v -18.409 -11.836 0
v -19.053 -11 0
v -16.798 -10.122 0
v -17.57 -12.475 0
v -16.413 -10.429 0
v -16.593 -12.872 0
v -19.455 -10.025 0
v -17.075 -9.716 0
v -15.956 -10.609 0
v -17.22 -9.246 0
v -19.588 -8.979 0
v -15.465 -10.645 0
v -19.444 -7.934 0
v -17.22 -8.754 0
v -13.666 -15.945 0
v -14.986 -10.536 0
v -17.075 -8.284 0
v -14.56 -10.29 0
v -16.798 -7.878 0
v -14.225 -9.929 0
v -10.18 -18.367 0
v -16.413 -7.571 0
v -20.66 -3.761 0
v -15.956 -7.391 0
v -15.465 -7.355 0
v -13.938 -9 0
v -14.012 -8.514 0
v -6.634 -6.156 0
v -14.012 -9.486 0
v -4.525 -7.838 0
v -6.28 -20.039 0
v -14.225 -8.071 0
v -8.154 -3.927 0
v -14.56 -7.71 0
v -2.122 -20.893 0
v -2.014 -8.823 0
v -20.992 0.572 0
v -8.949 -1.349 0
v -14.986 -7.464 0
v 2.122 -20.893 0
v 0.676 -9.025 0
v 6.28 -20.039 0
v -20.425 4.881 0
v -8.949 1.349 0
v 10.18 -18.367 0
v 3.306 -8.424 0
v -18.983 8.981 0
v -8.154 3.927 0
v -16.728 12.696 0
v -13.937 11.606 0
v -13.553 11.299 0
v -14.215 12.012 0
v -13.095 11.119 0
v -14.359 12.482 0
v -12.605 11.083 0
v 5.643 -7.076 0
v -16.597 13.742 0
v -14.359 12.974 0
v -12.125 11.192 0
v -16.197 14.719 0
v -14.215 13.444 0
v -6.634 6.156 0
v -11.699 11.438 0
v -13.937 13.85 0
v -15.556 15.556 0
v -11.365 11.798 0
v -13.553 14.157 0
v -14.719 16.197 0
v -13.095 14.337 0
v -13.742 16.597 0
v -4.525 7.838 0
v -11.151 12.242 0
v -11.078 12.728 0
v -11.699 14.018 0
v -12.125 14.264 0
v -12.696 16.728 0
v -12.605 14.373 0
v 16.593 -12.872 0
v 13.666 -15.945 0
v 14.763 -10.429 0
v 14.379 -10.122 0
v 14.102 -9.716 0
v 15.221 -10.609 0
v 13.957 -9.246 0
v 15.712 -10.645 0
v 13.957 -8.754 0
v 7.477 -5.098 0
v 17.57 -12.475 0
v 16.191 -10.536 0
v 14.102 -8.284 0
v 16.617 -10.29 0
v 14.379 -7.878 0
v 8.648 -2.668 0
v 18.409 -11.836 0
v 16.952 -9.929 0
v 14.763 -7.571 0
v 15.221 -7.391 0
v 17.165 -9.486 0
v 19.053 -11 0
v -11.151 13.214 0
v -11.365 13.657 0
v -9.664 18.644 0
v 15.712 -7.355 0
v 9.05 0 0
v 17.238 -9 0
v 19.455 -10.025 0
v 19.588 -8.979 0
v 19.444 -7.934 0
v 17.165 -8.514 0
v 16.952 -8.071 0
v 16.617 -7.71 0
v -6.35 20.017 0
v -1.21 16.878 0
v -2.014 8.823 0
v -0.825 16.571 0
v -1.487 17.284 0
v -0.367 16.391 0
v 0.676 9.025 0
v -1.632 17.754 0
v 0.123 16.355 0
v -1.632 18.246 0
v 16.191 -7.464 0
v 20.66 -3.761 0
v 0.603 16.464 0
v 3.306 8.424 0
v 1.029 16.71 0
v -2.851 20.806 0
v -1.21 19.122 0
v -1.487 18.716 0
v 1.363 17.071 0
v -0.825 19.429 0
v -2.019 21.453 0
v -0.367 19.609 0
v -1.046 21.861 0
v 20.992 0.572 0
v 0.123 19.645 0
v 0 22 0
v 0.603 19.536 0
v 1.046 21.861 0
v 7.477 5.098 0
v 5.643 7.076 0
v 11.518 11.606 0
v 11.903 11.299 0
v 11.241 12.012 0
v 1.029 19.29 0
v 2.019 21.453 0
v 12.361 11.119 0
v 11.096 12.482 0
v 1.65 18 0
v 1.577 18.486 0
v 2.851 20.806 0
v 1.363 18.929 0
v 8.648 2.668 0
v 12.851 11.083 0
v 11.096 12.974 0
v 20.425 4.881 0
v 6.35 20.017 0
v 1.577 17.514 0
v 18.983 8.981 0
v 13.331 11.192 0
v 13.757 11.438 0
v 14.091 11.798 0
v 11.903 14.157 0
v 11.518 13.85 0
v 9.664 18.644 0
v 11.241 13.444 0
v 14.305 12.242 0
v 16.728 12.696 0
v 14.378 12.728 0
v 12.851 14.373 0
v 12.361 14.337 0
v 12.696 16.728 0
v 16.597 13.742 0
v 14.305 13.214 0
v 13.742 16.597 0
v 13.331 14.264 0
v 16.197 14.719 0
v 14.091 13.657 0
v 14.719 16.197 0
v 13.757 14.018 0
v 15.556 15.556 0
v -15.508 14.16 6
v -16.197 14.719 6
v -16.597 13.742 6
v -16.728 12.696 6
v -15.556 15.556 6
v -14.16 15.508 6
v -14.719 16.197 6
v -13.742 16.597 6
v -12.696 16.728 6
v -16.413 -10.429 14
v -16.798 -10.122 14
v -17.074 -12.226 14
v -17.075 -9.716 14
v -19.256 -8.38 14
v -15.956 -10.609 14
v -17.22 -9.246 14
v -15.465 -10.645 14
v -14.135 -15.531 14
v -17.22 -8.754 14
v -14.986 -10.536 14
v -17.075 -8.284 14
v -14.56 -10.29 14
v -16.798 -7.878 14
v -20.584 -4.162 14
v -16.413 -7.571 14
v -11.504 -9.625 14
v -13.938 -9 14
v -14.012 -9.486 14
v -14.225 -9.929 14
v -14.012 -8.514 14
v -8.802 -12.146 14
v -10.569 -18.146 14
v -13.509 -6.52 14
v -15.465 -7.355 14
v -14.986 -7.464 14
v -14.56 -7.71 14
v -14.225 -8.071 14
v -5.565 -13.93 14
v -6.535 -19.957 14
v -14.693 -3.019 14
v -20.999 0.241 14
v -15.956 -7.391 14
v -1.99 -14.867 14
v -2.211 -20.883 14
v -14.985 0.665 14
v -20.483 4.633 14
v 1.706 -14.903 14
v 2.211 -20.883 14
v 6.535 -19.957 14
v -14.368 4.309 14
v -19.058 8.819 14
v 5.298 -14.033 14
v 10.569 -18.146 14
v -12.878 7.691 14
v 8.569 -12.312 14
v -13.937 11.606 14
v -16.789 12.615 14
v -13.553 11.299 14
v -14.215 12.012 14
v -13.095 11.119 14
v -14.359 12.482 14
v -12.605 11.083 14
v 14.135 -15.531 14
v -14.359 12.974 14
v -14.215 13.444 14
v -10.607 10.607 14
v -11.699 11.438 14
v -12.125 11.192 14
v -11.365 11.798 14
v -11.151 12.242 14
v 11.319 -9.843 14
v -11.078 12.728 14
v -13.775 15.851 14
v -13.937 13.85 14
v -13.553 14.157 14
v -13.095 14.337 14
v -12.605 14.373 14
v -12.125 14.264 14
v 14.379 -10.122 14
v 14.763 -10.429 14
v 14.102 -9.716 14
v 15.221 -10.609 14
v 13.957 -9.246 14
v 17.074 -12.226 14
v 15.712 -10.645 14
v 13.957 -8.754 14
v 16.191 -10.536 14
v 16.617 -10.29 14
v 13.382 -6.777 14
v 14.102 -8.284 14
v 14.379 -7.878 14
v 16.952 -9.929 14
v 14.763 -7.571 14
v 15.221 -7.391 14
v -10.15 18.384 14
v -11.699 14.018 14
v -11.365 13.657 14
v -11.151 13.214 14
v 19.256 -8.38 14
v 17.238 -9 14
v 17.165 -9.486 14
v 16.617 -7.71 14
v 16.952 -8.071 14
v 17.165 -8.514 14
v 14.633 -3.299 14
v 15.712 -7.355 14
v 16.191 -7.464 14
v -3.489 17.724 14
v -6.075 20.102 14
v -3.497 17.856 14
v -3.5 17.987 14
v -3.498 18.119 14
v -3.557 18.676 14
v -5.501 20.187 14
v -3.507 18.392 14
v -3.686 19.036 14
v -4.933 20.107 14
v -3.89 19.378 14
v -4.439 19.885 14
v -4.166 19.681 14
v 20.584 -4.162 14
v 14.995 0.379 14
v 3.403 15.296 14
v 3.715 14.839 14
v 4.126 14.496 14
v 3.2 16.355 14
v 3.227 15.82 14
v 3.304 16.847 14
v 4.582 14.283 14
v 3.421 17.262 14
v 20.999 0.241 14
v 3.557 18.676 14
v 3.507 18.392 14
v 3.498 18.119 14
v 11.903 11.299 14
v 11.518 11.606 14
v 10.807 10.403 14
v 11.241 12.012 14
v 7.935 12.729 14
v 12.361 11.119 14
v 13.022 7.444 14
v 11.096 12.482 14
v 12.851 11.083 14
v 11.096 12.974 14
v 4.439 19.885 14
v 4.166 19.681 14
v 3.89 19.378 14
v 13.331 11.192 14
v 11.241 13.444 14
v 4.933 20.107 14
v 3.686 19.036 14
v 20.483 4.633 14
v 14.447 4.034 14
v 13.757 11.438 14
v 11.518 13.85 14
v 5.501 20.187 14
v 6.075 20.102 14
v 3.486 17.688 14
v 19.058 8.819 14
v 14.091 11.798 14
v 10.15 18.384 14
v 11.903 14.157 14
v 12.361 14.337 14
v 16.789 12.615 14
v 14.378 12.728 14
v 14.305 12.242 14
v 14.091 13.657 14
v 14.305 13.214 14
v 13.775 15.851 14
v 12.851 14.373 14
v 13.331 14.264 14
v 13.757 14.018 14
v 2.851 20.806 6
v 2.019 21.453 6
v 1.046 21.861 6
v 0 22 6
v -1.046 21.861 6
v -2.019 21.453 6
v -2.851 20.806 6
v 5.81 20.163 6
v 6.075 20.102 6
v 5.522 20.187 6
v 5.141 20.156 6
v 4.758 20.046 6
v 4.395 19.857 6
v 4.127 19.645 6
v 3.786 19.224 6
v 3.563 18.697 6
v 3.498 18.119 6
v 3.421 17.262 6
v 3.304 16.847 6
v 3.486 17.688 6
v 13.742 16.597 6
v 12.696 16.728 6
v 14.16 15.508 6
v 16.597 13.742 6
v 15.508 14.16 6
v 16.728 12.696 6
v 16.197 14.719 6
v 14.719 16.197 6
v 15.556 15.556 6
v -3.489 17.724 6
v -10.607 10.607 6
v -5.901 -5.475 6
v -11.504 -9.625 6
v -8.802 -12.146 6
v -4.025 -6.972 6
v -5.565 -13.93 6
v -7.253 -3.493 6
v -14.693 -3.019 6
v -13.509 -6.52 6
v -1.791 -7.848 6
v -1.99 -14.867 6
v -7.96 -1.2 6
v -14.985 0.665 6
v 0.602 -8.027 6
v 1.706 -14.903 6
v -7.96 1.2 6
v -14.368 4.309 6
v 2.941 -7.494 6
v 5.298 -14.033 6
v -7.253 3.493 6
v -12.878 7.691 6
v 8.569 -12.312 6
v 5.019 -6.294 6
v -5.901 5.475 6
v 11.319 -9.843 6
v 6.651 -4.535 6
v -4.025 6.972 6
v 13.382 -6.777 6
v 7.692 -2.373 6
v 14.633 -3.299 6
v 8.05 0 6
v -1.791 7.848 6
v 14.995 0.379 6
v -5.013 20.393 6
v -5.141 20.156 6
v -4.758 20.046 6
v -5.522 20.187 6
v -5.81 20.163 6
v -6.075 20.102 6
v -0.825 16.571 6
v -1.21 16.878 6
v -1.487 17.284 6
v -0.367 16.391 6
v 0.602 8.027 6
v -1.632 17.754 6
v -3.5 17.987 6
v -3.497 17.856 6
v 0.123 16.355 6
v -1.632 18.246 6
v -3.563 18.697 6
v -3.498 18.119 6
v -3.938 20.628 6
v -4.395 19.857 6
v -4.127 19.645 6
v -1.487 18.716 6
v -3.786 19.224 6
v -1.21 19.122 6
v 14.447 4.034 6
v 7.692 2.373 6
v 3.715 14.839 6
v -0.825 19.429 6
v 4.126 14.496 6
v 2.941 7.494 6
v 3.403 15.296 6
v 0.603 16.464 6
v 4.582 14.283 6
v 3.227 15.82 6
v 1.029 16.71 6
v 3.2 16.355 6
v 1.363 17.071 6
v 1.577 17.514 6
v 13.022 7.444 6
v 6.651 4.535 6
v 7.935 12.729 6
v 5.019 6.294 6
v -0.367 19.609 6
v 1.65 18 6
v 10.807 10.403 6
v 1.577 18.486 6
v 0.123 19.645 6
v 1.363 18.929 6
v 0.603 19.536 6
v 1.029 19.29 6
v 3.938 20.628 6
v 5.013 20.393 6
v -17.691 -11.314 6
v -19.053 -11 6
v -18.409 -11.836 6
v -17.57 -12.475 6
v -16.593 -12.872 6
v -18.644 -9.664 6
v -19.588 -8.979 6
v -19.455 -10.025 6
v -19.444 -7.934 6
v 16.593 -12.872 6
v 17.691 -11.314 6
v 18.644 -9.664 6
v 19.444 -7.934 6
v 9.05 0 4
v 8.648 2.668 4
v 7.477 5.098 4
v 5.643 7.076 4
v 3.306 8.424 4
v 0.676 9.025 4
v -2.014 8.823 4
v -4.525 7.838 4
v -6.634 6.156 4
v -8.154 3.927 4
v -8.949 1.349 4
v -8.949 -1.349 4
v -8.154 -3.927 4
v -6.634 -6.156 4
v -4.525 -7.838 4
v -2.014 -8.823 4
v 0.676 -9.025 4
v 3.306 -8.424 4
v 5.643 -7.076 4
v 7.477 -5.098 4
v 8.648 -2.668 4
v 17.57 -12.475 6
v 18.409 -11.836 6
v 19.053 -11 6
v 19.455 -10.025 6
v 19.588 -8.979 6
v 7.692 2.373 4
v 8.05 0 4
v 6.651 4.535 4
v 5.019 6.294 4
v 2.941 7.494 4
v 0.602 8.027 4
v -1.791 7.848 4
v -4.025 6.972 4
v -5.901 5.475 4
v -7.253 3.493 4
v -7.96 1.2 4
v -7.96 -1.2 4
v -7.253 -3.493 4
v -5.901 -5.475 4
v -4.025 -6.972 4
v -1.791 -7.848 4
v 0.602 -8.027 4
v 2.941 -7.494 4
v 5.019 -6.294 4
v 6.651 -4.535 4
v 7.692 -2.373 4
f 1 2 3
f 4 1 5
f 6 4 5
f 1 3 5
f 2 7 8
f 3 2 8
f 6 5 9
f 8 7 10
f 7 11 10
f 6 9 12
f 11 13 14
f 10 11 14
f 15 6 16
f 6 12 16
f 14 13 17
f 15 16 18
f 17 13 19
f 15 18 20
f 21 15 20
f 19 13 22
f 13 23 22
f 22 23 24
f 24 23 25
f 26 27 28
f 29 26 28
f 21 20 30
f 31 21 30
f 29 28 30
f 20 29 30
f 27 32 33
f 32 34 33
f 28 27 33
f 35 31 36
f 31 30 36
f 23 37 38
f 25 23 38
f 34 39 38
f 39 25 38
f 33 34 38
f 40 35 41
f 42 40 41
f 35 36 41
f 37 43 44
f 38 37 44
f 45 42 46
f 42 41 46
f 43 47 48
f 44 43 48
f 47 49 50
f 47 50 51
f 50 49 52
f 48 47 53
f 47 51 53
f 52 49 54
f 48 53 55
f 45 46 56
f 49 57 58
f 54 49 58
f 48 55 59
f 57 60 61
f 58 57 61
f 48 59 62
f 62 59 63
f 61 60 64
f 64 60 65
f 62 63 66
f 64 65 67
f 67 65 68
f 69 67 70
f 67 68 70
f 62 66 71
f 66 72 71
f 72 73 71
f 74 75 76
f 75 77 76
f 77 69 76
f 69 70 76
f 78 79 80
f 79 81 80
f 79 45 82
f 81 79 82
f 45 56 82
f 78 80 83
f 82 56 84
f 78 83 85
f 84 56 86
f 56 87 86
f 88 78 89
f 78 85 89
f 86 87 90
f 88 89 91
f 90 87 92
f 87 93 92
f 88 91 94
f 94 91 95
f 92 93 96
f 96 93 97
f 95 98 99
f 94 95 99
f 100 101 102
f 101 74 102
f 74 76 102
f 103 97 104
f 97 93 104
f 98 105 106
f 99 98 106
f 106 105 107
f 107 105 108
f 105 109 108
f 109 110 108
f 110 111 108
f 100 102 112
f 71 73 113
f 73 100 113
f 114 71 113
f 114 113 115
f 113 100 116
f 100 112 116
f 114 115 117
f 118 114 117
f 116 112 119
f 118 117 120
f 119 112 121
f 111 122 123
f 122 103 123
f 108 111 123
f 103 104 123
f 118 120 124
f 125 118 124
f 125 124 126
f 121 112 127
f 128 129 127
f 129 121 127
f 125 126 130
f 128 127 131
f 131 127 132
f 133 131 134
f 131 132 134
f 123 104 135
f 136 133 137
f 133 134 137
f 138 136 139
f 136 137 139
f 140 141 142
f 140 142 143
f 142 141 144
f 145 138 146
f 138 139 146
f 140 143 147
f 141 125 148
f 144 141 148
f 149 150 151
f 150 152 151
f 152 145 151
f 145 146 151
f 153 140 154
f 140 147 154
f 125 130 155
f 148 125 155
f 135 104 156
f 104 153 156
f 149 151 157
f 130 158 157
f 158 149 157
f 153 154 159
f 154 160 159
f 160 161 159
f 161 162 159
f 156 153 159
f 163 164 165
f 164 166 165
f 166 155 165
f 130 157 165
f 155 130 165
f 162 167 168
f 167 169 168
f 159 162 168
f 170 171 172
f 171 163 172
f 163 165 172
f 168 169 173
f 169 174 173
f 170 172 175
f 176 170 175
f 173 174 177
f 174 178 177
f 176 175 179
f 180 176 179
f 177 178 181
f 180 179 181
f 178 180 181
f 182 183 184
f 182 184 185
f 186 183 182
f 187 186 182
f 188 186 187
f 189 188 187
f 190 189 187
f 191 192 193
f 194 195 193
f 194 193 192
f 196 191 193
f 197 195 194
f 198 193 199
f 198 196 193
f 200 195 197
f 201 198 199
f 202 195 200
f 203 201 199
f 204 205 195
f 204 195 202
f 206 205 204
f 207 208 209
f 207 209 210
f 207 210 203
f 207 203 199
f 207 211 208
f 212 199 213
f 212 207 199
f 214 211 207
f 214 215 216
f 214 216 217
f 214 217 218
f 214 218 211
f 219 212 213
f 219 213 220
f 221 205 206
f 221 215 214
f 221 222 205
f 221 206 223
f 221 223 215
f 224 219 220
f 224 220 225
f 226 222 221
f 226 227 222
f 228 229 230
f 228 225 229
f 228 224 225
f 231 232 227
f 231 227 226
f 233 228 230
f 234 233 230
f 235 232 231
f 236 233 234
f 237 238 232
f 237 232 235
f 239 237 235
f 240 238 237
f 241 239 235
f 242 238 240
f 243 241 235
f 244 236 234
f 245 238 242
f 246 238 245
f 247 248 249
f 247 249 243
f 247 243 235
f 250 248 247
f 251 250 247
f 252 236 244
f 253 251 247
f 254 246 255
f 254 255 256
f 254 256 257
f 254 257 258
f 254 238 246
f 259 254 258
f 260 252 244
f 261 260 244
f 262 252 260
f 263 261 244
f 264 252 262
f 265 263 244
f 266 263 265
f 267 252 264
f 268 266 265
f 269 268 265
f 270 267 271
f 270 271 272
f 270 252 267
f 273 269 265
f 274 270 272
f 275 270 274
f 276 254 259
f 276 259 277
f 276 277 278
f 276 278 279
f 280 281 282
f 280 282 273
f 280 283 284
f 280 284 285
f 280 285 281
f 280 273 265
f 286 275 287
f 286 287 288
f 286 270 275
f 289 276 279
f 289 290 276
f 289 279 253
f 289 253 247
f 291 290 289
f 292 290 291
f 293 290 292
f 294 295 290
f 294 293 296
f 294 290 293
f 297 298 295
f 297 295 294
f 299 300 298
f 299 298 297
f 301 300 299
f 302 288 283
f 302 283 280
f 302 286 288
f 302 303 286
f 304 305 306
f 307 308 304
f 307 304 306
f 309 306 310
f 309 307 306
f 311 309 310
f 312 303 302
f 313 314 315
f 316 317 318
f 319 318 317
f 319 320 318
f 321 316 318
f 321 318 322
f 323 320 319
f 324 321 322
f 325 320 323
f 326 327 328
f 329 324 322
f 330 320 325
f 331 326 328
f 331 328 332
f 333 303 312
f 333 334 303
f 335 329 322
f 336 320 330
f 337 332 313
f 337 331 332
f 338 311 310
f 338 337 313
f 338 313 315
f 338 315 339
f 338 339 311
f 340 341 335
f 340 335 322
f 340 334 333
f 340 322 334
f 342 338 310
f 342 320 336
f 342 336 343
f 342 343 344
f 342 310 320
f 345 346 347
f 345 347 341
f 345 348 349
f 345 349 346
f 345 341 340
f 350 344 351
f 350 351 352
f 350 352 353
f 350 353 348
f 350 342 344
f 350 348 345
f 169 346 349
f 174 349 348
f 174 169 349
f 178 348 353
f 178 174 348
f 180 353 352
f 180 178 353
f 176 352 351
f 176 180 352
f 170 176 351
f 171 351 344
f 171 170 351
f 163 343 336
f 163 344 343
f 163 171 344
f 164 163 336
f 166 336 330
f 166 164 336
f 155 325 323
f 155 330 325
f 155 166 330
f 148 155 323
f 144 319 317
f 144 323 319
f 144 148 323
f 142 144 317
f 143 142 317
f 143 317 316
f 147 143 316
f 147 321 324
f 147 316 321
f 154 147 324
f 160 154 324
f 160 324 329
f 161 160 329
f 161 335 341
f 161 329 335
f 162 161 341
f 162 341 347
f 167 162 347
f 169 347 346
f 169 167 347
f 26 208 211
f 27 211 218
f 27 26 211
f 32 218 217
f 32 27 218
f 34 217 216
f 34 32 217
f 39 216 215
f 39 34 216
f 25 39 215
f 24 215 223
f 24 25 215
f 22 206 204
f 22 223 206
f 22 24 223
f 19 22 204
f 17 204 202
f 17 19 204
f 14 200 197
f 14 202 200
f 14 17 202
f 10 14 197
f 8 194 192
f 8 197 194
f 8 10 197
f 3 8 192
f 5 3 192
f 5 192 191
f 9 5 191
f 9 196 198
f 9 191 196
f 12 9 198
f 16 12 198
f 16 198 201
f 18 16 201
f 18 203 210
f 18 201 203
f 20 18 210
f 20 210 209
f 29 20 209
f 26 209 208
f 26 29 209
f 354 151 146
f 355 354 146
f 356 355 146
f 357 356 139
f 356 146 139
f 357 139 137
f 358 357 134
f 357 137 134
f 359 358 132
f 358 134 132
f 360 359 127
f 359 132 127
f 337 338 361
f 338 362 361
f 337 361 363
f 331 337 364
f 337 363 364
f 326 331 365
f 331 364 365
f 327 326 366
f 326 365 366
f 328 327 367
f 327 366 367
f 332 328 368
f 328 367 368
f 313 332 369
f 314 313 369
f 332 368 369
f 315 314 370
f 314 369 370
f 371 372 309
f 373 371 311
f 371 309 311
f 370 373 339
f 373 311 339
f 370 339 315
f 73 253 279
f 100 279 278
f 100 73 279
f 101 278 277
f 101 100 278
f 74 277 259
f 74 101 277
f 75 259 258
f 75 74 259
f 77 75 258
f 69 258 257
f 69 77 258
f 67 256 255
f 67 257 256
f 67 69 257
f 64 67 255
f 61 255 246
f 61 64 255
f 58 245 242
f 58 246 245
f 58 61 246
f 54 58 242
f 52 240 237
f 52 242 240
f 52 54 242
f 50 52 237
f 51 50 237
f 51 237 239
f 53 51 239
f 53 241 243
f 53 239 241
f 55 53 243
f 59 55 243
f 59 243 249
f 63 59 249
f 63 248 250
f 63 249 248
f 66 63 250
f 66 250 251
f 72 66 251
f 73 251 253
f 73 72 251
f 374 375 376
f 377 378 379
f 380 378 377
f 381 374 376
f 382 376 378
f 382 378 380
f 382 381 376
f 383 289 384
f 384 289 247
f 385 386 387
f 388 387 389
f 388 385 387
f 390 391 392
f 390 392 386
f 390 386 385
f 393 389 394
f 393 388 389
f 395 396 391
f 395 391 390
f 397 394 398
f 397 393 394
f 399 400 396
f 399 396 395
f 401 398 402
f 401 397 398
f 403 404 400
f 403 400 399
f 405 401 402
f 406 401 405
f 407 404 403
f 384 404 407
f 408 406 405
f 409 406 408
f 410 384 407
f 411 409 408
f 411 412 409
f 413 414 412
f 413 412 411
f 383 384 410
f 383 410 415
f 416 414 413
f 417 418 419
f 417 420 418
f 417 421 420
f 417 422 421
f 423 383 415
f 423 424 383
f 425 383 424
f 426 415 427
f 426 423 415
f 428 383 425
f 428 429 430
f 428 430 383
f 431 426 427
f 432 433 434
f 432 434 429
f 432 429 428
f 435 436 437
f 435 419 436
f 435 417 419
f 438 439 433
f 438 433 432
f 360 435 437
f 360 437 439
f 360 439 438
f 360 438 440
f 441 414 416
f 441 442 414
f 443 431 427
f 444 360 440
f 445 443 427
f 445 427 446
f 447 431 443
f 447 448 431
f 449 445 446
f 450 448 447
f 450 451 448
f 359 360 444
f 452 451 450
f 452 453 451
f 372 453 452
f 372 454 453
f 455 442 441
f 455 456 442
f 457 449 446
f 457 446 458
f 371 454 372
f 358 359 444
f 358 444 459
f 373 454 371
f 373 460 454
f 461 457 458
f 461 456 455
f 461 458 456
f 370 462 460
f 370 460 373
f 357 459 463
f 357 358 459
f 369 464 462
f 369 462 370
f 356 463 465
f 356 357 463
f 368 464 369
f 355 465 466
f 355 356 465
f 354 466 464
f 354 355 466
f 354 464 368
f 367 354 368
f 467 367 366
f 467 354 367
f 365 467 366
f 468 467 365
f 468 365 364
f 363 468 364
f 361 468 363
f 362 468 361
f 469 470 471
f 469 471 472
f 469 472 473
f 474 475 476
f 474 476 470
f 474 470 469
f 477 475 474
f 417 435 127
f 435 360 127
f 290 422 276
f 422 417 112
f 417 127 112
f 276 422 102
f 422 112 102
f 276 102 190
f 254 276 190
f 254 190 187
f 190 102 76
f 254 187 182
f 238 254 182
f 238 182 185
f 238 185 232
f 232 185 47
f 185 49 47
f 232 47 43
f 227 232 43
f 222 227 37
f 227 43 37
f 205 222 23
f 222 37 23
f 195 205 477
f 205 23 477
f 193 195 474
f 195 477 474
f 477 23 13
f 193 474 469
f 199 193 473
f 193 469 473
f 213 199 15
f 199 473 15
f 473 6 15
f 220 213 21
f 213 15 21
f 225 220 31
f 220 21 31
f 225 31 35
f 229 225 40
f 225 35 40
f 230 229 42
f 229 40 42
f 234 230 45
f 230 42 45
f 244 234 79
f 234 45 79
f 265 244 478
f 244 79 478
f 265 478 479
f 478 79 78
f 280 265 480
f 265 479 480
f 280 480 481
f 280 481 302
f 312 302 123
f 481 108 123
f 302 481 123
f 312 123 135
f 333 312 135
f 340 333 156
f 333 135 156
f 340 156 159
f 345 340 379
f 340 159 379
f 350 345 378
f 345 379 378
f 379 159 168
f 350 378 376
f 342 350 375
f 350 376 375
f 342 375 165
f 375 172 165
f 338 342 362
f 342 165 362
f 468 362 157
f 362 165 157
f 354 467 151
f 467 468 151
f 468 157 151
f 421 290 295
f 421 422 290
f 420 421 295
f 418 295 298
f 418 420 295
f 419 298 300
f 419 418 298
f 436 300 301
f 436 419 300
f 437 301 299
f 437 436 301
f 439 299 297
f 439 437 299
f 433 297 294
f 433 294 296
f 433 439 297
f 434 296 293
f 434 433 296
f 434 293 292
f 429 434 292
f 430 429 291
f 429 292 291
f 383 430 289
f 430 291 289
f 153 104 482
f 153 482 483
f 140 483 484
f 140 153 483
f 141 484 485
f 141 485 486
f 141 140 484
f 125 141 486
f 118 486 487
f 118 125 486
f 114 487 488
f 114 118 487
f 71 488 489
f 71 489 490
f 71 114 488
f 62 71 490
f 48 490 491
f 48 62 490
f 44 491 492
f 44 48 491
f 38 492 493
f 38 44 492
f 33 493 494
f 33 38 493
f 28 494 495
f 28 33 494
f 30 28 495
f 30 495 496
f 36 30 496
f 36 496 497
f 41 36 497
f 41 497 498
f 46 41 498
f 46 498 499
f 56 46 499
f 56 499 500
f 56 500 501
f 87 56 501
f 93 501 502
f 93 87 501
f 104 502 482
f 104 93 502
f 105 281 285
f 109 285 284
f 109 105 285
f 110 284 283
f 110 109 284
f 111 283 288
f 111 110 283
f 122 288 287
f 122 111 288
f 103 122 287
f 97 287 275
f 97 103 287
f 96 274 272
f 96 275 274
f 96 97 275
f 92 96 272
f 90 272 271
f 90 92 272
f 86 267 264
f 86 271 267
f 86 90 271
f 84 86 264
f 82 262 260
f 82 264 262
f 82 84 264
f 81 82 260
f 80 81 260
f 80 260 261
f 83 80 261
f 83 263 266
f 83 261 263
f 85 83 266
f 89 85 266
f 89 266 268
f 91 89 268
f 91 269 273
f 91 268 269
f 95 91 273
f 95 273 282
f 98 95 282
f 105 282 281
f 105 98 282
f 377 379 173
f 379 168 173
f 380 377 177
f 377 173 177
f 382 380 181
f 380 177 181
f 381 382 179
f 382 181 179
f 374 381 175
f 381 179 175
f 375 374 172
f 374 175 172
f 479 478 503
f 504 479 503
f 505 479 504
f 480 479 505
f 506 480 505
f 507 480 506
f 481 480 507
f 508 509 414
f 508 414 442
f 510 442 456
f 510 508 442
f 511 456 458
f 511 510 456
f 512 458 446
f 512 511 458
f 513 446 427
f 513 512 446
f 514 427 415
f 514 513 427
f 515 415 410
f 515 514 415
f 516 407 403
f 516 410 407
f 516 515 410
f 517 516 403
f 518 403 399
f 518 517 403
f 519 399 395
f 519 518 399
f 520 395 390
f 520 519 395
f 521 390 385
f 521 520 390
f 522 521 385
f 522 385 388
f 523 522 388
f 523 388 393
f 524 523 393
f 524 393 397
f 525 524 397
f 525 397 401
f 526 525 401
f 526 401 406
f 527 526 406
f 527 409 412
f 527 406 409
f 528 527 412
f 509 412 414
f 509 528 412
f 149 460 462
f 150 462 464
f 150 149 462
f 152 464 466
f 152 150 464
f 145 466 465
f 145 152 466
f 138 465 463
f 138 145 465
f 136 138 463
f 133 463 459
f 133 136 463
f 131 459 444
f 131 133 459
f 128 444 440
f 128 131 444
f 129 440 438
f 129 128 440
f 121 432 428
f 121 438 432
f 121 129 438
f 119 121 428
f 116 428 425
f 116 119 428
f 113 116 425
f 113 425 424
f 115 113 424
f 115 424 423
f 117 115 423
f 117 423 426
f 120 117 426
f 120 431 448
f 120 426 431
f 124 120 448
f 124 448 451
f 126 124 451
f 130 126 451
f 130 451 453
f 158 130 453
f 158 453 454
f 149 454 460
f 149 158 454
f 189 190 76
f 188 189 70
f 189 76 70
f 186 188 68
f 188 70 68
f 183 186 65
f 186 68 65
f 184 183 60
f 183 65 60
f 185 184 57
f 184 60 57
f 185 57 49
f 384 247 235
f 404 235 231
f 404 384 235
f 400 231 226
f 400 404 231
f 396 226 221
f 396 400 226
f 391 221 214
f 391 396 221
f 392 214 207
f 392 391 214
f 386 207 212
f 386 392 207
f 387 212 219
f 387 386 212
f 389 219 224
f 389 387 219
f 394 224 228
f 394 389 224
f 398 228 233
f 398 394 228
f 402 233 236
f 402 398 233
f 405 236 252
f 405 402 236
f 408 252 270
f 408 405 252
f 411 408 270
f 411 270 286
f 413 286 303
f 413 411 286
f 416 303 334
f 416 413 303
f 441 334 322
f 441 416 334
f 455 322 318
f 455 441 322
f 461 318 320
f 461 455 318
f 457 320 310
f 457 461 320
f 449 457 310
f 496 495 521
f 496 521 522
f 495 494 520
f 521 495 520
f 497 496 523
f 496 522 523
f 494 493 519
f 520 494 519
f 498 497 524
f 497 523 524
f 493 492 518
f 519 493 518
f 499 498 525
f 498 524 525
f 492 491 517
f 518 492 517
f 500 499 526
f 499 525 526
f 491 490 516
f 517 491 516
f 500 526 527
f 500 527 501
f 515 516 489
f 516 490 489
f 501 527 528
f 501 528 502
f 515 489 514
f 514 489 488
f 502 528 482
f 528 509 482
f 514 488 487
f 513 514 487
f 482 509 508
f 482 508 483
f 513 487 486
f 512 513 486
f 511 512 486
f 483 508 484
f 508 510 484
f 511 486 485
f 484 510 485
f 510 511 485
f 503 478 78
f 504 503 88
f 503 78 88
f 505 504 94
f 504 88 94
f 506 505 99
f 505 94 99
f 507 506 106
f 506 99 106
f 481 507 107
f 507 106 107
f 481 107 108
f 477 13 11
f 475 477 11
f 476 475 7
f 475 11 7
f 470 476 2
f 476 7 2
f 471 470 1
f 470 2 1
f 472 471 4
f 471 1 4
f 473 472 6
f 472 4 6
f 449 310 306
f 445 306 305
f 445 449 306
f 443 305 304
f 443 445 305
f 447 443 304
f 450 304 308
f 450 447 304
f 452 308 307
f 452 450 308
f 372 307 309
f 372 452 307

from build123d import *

# Parameters (mm, degrees)
SKETCH_R        = 21
PAD_DEPTH       = 14
SKETCH001_R     = 9.05
POCKET_DEPTH    = 4
SKETCH002_R     = 8.05
POCKET001_DEPTH = 14.001
SKETCH003_R     = 15
POCKET002_DEPTH = 8.001
POCKET003_DEPTH = 8
SKETCH005_R     = 3.5
POCKET004_DEPTH = 8
FILLET_R        = 2
SKETCH006_R     = 4
PAD001_DEPTH    = 6
SKETCH007_R     = 1.65
POCKET005_DEPTH = 14.001


with BuildPart() as part:
    # Sketch → Pad (new body)
    with BuildSketch(Plane.XY):
        Circle(SKETCH_R)
    extrude(amount=PAD_DEPTH)

    # Sketch001 (on DatumPlane) → Pocket (cut)
    with BuildSketch(Plane.XY):
        Circle(SKETCH001_R)
    extrude(amount=POCKET_DEPTH, mode=Mode.SUBTRACT)

    # Sketch002 (on DatumPlane) → Pocket001 (cut, through all)
    with BuildSketch(Plane.XY):
        Circle(SKETCH002_R)
    extrude(amount=POCKET001_DEPTH, mode=Mode.SUBTRACT)

    # Sketch003 (on DatumPlane) → Pocket002 (cut, through all)
    with BuildSketch(Plane.XY.offset(6)):
        Circle(SKETCH003_R)
    extrude(amount=POCKET002_DEPTH, mode=Mode.SUBTRACT)

    # Sketch004 (on DatumPlane) → Pocket003 (cut)
    with BuildSketch(Plane.XY.offset(14)):
        Polygon((-10.606602, 10.606602), (0, 10.606602), (0, 21.213203), align=None)
    extrude(amount=-POCKET003_DEPTH, mode=Mode.SUBTRACT)

    # Sketch005 (on DatumPlane) → Pocket004 (cut)
    with BuildSketch(Plane.XY.offset(14)):
        with Locations((0, 18)):
            Circle(SKETCH005_R)
    extrude(amount=-POCKET004_DEPTH, mode=Mode.SUBTRACT)

    # Fillet
    fillet_edges = [part.edges().sort_by_distance(p)[0] for p in [
        (-1.945126, 20.909722, 10),
        (1.945126, 20.909722, 10),
        (1.643223, 14.909722, 10),
    ]]
    fillet(fillet_edges, radius=FILLET_R)

    # Sketch006 (on DatumPlane) → Pad001 (join)
    with BuildSketch(Plane.XY):
        with Locations((0, 18)):
            Circle(SKETCH006_R)
        with Locations((-12.727922, 12.727922)):
            Circle(SKETCH006_R)
        with Locations((12.727922, 12.727922)):
            Circle(SKETCH006_R)
        with Locations((-15.588457, -9)):
            Circle(SKETCH006_R)
        with Locations((15.588457, -9)):
            Circle(SKETCH006_R)
    extrude(amount=PAD001_DEPTH)

    # Sketch007 (on DatumPlane) → Pocket005 (cut, through all)
    with BuildSketch(Plane.XY):
        with Locations((-12.727922, 12.727922)):
            Circle(SKETCH007_R)
        with Locations((12.727922, 12.727922)):
            Circle(SKETCH007_R)
        with Locations((0, 18)):
            Circle(SKETCH007_R)
        with Locations((-15.588457, -9)):
            Circle(SKETCH007_R)
        with Locations((15.588457, -9)):
            Circle(SKETCH007_R)
    extrude(amount=POCKET005_DEPTH, mode=Mode.SUBTRACT)


solid = part.part
